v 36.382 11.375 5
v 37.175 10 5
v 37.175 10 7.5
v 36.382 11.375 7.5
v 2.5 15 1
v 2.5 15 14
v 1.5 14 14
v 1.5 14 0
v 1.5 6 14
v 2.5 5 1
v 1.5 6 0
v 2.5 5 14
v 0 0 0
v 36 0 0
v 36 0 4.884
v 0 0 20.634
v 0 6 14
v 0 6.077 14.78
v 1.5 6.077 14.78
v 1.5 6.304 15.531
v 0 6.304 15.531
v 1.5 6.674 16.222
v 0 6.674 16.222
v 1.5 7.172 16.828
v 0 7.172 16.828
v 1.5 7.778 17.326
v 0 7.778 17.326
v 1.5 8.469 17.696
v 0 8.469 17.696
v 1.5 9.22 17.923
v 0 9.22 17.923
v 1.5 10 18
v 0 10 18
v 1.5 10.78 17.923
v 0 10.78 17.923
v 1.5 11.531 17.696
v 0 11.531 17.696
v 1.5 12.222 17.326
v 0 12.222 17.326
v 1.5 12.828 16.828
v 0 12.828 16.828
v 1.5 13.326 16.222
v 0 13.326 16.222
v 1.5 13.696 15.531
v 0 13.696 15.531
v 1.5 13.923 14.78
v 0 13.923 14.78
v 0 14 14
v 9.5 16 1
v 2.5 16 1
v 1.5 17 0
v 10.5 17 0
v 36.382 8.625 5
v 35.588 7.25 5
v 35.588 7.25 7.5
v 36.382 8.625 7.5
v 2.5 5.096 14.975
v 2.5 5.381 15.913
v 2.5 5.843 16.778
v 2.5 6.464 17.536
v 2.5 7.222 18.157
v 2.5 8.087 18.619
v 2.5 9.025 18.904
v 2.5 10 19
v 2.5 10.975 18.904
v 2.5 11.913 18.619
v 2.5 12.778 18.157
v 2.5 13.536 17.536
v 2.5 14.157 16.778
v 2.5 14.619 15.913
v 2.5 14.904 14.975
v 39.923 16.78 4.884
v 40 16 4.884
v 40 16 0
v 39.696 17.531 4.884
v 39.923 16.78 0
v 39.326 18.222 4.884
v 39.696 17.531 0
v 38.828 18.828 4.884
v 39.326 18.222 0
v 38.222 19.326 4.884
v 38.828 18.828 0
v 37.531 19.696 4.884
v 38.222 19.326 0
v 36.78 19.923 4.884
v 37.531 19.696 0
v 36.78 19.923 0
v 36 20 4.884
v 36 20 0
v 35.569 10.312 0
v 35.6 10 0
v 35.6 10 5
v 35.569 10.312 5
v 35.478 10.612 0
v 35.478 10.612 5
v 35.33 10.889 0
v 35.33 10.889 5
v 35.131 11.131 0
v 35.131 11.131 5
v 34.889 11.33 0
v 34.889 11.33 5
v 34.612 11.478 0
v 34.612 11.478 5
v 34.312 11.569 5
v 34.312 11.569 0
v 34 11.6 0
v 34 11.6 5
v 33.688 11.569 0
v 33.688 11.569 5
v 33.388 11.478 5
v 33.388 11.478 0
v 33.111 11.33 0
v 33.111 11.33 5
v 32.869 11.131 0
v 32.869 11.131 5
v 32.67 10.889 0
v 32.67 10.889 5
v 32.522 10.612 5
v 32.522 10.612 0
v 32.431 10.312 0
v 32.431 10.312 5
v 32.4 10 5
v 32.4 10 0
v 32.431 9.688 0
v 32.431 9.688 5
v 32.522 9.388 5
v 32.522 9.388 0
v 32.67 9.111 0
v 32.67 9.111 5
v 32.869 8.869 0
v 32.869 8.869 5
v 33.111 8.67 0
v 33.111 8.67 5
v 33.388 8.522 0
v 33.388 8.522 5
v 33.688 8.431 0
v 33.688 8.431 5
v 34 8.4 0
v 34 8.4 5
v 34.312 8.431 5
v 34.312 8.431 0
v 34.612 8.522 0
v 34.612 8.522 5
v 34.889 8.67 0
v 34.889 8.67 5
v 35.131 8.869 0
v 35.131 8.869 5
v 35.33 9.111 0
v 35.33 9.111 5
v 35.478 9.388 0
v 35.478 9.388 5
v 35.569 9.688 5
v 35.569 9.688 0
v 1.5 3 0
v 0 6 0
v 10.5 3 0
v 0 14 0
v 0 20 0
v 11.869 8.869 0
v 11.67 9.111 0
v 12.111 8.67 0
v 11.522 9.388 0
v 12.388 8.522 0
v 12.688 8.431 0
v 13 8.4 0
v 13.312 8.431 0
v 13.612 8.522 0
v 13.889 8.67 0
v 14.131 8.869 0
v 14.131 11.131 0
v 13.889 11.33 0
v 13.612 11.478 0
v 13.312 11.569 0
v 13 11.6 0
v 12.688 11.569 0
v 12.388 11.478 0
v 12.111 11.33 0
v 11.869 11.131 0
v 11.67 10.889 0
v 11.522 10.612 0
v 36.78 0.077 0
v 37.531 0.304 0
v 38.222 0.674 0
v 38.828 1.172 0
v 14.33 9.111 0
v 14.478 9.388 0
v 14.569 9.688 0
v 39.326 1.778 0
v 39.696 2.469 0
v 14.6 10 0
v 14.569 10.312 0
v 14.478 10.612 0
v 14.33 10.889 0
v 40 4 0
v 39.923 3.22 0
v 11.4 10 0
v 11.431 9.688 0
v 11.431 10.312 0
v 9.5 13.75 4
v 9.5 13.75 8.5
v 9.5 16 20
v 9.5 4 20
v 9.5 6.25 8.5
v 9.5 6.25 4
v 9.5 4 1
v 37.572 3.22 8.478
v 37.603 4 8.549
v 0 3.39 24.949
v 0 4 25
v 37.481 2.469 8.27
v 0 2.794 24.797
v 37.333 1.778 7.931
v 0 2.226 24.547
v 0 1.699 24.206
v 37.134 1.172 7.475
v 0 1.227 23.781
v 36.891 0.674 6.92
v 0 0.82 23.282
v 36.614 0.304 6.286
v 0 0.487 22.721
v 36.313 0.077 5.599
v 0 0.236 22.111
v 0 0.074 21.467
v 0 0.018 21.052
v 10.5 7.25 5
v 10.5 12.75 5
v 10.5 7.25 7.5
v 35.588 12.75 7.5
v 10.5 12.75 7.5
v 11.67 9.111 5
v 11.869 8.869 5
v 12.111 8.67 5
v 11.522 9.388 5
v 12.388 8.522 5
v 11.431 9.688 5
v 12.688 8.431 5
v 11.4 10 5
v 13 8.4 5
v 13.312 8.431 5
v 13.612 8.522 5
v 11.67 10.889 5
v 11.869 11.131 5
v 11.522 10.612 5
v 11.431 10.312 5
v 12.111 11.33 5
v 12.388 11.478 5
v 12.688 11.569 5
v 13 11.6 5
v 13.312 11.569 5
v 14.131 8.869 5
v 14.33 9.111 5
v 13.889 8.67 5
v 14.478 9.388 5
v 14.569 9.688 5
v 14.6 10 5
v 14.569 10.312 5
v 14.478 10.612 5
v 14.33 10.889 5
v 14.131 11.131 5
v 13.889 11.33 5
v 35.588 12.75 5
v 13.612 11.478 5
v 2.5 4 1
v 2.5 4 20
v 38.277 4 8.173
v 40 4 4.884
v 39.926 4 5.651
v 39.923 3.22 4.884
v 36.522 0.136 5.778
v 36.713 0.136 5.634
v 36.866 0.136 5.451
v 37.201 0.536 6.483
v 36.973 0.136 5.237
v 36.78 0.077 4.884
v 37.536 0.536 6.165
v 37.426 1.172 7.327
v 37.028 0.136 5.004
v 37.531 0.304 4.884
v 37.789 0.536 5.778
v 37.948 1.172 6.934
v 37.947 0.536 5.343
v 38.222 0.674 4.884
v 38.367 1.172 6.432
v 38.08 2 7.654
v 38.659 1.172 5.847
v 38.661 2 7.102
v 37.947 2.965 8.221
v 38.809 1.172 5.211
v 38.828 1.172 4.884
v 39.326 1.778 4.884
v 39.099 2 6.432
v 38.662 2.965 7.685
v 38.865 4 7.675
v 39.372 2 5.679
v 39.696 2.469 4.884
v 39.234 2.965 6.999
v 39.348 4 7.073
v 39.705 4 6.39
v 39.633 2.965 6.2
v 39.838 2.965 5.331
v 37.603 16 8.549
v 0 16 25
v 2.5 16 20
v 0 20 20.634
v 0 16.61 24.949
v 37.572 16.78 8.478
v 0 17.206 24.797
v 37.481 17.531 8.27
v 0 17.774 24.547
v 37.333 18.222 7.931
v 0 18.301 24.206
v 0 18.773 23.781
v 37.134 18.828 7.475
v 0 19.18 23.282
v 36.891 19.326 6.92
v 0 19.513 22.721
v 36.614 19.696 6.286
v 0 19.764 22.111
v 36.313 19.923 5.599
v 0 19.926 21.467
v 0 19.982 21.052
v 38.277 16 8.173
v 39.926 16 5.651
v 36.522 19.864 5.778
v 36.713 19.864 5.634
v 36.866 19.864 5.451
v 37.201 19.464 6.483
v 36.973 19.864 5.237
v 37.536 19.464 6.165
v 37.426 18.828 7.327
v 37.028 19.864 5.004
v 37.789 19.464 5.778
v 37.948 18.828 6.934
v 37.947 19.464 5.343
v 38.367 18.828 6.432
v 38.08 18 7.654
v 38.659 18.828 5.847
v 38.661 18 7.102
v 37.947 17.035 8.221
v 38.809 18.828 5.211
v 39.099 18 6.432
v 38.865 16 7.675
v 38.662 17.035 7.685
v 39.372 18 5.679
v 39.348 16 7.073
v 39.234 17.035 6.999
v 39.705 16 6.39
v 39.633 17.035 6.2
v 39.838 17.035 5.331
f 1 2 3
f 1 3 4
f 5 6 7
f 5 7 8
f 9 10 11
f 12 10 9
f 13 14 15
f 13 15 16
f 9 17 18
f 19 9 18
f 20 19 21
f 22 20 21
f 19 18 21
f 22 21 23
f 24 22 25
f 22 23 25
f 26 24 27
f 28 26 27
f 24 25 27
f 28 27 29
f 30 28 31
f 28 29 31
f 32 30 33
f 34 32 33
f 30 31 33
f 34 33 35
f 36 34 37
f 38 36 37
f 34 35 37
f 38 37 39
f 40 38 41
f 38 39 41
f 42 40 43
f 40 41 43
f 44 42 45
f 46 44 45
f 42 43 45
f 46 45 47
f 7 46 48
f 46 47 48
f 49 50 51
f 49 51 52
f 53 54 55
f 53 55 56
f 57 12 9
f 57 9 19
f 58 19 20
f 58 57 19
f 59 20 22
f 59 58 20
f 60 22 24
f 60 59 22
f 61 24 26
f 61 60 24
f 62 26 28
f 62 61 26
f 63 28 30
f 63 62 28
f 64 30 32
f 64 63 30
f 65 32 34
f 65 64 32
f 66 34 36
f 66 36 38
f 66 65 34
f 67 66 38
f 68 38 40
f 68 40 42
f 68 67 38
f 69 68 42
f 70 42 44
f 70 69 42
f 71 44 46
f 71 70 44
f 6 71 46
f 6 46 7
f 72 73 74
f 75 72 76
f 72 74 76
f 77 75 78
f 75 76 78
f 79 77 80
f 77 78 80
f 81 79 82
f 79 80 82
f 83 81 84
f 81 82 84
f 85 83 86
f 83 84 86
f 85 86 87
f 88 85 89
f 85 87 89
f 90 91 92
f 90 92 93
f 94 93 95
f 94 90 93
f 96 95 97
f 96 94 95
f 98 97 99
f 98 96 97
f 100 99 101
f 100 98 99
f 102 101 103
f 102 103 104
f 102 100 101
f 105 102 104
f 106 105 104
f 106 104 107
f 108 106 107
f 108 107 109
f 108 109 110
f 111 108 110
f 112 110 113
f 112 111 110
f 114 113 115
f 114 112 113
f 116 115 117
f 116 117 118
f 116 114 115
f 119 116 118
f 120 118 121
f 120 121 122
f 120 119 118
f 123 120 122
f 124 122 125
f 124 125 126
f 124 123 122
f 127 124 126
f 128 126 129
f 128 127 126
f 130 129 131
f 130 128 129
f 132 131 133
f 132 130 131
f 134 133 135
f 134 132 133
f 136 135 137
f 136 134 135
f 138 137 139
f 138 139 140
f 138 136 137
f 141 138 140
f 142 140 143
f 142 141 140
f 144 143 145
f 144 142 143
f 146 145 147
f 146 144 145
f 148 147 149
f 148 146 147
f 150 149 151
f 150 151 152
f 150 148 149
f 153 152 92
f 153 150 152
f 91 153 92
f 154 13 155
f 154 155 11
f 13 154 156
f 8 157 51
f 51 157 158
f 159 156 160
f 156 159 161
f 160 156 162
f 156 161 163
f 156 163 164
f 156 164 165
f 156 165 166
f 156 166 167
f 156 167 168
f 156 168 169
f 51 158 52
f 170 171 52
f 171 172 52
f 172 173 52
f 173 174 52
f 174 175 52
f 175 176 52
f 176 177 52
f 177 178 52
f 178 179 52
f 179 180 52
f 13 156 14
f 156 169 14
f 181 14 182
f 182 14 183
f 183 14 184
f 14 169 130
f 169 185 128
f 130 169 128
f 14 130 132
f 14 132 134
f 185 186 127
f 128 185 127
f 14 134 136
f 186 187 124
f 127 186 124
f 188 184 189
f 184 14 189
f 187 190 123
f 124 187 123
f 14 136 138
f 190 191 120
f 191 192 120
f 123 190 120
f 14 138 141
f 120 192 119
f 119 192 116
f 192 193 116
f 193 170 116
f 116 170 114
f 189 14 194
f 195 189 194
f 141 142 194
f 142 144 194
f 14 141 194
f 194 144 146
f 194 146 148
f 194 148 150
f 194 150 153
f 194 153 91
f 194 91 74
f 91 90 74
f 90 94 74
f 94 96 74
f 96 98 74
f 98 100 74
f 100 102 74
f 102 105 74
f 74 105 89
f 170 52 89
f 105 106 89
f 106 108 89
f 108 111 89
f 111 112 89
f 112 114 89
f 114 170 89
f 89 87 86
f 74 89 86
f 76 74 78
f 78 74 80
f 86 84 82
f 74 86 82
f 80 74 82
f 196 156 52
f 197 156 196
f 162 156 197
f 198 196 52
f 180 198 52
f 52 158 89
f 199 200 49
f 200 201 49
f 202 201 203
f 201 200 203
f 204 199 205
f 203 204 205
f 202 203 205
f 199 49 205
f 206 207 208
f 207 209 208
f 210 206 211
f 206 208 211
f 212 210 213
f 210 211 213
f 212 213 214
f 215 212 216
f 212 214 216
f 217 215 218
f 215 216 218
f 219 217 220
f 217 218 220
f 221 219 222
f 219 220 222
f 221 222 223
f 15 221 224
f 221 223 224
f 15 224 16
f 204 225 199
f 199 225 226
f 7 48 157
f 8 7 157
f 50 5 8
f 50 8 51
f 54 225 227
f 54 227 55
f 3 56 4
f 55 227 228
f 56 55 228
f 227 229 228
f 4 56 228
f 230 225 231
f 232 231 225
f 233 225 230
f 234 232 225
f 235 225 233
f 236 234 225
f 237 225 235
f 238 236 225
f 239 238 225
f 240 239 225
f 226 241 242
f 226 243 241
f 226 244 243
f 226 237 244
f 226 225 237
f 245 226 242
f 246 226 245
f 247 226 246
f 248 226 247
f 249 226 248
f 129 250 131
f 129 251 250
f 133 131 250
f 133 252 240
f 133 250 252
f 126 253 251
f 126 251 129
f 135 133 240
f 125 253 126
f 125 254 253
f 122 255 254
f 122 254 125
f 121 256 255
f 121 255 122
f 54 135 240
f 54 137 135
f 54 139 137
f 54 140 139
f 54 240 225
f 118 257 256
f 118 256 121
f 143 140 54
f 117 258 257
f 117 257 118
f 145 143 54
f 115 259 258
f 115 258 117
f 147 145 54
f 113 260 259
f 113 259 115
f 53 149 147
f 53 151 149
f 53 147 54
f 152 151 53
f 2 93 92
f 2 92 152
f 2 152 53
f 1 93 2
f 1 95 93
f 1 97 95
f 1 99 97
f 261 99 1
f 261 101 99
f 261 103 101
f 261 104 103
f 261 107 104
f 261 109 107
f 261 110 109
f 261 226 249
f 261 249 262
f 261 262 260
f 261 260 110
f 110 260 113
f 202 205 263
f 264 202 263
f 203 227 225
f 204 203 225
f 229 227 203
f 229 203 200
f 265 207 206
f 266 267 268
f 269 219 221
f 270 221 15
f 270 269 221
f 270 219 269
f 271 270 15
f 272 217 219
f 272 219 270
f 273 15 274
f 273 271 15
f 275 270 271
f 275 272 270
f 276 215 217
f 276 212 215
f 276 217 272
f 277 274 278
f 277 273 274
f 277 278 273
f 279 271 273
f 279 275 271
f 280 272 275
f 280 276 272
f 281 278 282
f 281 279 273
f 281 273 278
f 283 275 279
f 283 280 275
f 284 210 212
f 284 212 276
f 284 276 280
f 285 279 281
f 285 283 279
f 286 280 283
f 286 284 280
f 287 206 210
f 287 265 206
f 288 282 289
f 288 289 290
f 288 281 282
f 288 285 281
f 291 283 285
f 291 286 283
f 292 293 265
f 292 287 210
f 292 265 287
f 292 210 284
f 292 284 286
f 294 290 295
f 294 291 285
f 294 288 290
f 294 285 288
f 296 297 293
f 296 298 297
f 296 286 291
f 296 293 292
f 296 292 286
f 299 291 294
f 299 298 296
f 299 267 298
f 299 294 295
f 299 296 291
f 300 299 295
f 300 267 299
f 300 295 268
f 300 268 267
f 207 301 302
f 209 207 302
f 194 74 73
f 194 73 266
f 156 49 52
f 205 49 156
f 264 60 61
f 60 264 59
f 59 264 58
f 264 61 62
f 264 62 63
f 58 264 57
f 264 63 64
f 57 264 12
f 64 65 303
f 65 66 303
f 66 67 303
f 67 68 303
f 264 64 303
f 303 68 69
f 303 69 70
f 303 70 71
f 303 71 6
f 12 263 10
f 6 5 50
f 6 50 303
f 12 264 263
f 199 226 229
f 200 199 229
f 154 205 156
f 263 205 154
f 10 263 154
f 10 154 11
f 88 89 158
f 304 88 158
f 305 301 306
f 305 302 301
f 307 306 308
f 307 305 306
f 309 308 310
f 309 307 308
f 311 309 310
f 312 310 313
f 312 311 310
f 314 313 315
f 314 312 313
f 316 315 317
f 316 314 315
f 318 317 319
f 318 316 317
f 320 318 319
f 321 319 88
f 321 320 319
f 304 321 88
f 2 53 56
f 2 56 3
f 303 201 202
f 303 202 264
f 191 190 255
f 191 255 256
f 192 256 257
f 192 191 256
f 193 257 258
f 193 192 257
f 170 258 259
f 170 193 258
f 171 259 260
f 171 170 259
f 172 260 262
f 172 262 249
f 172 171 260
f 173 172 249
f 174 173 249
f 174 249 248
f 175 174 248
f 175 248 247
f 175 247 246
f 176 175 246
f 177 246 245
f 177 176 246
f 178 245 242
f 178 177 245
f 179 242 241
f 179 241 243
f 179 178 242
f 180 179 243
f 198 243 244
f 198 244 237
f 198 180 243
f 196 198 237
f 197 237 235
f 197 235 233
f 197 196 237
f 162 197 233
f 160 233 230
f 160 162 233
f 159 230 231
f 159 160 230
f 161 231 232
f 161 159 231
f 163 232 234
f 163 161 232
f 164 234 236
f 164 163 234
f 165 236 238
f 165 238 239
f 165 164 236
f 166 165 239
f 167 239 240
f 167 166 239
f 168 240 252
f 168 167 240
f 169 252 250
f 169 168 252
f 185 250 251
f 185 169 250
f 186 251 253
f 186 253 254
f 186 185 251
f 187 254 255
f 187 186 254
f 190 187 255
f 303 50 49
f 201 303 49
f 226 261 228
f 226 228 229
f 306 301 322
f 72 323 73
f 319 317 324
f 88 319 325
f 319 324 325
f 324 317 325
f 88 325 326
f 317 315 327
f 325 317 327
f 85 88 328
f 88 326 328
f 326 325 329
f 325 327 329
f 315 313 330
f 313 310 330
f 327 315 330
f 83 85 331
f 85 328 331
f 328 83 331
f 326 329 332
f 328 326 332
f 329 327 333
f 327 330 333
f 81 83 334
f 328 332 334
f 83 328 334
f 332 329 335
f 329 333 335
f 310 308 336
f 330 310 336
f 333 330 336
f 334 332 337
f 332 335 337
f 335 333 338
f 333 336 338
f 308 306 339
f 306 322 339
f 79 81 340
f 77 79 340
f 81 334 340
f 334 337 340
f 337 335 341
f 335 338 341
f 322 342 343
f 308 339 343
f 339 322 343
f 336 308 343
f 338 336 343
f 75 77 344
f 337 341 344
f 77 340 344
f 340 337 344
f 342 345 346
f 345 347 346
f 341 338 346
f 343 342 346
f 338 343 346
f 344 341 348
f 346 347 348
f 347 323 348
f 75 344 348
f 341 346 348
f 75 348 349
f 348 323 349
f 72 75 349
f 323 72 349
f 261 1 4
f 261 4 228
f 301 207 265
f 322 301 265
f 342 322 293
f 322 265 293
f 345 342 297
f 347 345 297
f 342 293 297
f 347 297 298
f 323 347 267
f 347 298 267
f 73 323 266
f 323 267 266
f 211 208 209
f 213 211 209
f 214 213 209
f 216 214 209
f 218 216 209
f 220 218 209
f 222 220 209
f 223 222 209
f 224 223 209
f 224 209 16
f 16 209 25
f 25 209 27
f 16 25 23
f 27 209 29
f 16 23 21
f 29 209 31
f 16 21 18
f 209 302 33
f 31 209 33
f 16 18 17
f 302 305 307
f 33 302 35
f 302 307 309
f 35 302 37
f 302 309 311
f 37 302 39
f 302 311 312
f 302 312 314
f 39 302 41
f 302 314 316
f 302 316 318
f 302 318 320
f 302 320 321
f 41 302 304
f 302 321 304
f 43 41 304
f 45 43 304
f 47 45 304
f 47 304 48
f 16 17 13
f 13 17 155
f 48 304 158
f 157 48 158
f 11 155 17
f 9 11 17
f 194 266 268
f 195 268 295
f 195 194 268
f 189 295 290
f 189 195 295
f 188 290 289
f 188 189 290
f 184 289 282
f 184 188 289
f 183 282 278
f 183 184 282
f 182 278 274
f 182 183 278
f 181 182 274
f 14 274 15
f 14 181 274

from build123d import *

# Parameters (mm, degrees)
SKETCH1_W           = 40
SKETCH1_H           = 20
SKETCH1_R           = 1.6
BOSS_EXTRUDE1_DEPTH = 5
BOSS_EXTRUDE2_DEPTH = 2.5
BOSS_EXTRUDE3_DEPTH = 20
CUT_EXTRUDE1_DEPTH  = 2.5
CUT_EXTRUDE2_DEPTH  = 20
FILLET1_R           = 4
CHAMFER1_SIZE       = 1


with BuildPart() as part:
    # Sketch1 → Boss-Extrude1 (new body)
    with BuildSketch(Plane.XY):
        with Locations((20, 10)):
            Rectangle(SKETCH1_W, SKETCH1_H)
        with Locations((13, 10)):
            Circle(SKETCH1_R, mode=Mode.SUBTRACT)
        with Locations((34, 10)):
            Circle(SKETCH1_R, mode=Mode.SUBTRACT)
    extrude(amount=BOSS_EXTRUDE1_DEPTH)

    # Sketch3 → Boss-Extrude2 (add)
    with BuildSketch(Plane.XY.offset(5)):
        Polygon((35.58771324, 7.25), (36.38156986, 8.625), (37.175426481, 10), (36.38156986, 11.375), (35.58771324, 12.75), (0, 12.75), (0, 20), (40, 20), (40, 0), (0, 0), (0, 7.25), align=None)
    extrude(amount=BOSS_EXTRUDE2_DEPTH)

    # Sketch4 → Boss-Extrude3 (add, through all)
    with BuildSketch(Plane(origin=(0, 20, 0), x_dir=(1, 0, 0), z_dir=(0, 1, 0))):
        Polygon((40, -7.5), (0, -25), (0, -7.5), align=None)
    extrude(amount=-BOSS_EXTRUDE3_DEPTH)

    # Sketch6 → Cut-Extrude1 (cut)
    with BuildSketch(Plane.ZY):
        with BuildLine():
            Line((0, 10), (0, 6))
            Line((0, 6), (14, 6))
            ThreePointArc((14, 6), (18, 10), (14, 14))
            Line((14, 14), (0, 14))
            Line((0, 14), (0, 10))
        make_face()
    extrude(amount=-CUT_EXTRUDE1_DEPTH, mode=Mode.SUBTRACT)

    # Sketch7 → Cut-Extrude2 (cut)
    with BuildSketch(Plane(origin=(0, 0, 0), x_dir=(-1, 0, 0), z_dir=(0, 0, -1))):
        Polygon((-2.5, 14), (-2.5, 16), (-9.5, 16), (-9.5, 4), (-2.5, 4), (-2.5, 6), align=None)
    extrude(amount=-CUT_EXTRUDE2_DEPTH, mode=Mode.SUBTRACT)

    # Fillet1
    fillet1_edges = [part.edges().sort_by_distance(p)[0] for p in [
        (40, 10, 7.5),
        (20, 0, 16.25),
        (20, 20, 16.25),
        (40, 20, 3.75),
        (40, 0, 3.75),
    ]]
    fillet(fillet1_edges, radius=FILLET1_R)

    # Chamfer1
    chamfer1_edges = [part.edges().sort_by_distance(p)[0] for p in [
        (2.5, 14, 7),
        (2.5, 10, 18),
        (2.5, 6, 7),
        (9.5, 12.75, 6.25),
        (9.5, 7.25, 6.25),
        (2.5, 5, 0),
        (2.5, 15, 0),
        (6, 4, 0),
        (9.5, 10, 5),
        (9.5, 10, 7.5),
        (9.5, 10, 0),
        (6, 16, 0),
    ]]
    chamfer(chamfer1_edges, length=CHAMFER1_SIZE)


solid = part.part
